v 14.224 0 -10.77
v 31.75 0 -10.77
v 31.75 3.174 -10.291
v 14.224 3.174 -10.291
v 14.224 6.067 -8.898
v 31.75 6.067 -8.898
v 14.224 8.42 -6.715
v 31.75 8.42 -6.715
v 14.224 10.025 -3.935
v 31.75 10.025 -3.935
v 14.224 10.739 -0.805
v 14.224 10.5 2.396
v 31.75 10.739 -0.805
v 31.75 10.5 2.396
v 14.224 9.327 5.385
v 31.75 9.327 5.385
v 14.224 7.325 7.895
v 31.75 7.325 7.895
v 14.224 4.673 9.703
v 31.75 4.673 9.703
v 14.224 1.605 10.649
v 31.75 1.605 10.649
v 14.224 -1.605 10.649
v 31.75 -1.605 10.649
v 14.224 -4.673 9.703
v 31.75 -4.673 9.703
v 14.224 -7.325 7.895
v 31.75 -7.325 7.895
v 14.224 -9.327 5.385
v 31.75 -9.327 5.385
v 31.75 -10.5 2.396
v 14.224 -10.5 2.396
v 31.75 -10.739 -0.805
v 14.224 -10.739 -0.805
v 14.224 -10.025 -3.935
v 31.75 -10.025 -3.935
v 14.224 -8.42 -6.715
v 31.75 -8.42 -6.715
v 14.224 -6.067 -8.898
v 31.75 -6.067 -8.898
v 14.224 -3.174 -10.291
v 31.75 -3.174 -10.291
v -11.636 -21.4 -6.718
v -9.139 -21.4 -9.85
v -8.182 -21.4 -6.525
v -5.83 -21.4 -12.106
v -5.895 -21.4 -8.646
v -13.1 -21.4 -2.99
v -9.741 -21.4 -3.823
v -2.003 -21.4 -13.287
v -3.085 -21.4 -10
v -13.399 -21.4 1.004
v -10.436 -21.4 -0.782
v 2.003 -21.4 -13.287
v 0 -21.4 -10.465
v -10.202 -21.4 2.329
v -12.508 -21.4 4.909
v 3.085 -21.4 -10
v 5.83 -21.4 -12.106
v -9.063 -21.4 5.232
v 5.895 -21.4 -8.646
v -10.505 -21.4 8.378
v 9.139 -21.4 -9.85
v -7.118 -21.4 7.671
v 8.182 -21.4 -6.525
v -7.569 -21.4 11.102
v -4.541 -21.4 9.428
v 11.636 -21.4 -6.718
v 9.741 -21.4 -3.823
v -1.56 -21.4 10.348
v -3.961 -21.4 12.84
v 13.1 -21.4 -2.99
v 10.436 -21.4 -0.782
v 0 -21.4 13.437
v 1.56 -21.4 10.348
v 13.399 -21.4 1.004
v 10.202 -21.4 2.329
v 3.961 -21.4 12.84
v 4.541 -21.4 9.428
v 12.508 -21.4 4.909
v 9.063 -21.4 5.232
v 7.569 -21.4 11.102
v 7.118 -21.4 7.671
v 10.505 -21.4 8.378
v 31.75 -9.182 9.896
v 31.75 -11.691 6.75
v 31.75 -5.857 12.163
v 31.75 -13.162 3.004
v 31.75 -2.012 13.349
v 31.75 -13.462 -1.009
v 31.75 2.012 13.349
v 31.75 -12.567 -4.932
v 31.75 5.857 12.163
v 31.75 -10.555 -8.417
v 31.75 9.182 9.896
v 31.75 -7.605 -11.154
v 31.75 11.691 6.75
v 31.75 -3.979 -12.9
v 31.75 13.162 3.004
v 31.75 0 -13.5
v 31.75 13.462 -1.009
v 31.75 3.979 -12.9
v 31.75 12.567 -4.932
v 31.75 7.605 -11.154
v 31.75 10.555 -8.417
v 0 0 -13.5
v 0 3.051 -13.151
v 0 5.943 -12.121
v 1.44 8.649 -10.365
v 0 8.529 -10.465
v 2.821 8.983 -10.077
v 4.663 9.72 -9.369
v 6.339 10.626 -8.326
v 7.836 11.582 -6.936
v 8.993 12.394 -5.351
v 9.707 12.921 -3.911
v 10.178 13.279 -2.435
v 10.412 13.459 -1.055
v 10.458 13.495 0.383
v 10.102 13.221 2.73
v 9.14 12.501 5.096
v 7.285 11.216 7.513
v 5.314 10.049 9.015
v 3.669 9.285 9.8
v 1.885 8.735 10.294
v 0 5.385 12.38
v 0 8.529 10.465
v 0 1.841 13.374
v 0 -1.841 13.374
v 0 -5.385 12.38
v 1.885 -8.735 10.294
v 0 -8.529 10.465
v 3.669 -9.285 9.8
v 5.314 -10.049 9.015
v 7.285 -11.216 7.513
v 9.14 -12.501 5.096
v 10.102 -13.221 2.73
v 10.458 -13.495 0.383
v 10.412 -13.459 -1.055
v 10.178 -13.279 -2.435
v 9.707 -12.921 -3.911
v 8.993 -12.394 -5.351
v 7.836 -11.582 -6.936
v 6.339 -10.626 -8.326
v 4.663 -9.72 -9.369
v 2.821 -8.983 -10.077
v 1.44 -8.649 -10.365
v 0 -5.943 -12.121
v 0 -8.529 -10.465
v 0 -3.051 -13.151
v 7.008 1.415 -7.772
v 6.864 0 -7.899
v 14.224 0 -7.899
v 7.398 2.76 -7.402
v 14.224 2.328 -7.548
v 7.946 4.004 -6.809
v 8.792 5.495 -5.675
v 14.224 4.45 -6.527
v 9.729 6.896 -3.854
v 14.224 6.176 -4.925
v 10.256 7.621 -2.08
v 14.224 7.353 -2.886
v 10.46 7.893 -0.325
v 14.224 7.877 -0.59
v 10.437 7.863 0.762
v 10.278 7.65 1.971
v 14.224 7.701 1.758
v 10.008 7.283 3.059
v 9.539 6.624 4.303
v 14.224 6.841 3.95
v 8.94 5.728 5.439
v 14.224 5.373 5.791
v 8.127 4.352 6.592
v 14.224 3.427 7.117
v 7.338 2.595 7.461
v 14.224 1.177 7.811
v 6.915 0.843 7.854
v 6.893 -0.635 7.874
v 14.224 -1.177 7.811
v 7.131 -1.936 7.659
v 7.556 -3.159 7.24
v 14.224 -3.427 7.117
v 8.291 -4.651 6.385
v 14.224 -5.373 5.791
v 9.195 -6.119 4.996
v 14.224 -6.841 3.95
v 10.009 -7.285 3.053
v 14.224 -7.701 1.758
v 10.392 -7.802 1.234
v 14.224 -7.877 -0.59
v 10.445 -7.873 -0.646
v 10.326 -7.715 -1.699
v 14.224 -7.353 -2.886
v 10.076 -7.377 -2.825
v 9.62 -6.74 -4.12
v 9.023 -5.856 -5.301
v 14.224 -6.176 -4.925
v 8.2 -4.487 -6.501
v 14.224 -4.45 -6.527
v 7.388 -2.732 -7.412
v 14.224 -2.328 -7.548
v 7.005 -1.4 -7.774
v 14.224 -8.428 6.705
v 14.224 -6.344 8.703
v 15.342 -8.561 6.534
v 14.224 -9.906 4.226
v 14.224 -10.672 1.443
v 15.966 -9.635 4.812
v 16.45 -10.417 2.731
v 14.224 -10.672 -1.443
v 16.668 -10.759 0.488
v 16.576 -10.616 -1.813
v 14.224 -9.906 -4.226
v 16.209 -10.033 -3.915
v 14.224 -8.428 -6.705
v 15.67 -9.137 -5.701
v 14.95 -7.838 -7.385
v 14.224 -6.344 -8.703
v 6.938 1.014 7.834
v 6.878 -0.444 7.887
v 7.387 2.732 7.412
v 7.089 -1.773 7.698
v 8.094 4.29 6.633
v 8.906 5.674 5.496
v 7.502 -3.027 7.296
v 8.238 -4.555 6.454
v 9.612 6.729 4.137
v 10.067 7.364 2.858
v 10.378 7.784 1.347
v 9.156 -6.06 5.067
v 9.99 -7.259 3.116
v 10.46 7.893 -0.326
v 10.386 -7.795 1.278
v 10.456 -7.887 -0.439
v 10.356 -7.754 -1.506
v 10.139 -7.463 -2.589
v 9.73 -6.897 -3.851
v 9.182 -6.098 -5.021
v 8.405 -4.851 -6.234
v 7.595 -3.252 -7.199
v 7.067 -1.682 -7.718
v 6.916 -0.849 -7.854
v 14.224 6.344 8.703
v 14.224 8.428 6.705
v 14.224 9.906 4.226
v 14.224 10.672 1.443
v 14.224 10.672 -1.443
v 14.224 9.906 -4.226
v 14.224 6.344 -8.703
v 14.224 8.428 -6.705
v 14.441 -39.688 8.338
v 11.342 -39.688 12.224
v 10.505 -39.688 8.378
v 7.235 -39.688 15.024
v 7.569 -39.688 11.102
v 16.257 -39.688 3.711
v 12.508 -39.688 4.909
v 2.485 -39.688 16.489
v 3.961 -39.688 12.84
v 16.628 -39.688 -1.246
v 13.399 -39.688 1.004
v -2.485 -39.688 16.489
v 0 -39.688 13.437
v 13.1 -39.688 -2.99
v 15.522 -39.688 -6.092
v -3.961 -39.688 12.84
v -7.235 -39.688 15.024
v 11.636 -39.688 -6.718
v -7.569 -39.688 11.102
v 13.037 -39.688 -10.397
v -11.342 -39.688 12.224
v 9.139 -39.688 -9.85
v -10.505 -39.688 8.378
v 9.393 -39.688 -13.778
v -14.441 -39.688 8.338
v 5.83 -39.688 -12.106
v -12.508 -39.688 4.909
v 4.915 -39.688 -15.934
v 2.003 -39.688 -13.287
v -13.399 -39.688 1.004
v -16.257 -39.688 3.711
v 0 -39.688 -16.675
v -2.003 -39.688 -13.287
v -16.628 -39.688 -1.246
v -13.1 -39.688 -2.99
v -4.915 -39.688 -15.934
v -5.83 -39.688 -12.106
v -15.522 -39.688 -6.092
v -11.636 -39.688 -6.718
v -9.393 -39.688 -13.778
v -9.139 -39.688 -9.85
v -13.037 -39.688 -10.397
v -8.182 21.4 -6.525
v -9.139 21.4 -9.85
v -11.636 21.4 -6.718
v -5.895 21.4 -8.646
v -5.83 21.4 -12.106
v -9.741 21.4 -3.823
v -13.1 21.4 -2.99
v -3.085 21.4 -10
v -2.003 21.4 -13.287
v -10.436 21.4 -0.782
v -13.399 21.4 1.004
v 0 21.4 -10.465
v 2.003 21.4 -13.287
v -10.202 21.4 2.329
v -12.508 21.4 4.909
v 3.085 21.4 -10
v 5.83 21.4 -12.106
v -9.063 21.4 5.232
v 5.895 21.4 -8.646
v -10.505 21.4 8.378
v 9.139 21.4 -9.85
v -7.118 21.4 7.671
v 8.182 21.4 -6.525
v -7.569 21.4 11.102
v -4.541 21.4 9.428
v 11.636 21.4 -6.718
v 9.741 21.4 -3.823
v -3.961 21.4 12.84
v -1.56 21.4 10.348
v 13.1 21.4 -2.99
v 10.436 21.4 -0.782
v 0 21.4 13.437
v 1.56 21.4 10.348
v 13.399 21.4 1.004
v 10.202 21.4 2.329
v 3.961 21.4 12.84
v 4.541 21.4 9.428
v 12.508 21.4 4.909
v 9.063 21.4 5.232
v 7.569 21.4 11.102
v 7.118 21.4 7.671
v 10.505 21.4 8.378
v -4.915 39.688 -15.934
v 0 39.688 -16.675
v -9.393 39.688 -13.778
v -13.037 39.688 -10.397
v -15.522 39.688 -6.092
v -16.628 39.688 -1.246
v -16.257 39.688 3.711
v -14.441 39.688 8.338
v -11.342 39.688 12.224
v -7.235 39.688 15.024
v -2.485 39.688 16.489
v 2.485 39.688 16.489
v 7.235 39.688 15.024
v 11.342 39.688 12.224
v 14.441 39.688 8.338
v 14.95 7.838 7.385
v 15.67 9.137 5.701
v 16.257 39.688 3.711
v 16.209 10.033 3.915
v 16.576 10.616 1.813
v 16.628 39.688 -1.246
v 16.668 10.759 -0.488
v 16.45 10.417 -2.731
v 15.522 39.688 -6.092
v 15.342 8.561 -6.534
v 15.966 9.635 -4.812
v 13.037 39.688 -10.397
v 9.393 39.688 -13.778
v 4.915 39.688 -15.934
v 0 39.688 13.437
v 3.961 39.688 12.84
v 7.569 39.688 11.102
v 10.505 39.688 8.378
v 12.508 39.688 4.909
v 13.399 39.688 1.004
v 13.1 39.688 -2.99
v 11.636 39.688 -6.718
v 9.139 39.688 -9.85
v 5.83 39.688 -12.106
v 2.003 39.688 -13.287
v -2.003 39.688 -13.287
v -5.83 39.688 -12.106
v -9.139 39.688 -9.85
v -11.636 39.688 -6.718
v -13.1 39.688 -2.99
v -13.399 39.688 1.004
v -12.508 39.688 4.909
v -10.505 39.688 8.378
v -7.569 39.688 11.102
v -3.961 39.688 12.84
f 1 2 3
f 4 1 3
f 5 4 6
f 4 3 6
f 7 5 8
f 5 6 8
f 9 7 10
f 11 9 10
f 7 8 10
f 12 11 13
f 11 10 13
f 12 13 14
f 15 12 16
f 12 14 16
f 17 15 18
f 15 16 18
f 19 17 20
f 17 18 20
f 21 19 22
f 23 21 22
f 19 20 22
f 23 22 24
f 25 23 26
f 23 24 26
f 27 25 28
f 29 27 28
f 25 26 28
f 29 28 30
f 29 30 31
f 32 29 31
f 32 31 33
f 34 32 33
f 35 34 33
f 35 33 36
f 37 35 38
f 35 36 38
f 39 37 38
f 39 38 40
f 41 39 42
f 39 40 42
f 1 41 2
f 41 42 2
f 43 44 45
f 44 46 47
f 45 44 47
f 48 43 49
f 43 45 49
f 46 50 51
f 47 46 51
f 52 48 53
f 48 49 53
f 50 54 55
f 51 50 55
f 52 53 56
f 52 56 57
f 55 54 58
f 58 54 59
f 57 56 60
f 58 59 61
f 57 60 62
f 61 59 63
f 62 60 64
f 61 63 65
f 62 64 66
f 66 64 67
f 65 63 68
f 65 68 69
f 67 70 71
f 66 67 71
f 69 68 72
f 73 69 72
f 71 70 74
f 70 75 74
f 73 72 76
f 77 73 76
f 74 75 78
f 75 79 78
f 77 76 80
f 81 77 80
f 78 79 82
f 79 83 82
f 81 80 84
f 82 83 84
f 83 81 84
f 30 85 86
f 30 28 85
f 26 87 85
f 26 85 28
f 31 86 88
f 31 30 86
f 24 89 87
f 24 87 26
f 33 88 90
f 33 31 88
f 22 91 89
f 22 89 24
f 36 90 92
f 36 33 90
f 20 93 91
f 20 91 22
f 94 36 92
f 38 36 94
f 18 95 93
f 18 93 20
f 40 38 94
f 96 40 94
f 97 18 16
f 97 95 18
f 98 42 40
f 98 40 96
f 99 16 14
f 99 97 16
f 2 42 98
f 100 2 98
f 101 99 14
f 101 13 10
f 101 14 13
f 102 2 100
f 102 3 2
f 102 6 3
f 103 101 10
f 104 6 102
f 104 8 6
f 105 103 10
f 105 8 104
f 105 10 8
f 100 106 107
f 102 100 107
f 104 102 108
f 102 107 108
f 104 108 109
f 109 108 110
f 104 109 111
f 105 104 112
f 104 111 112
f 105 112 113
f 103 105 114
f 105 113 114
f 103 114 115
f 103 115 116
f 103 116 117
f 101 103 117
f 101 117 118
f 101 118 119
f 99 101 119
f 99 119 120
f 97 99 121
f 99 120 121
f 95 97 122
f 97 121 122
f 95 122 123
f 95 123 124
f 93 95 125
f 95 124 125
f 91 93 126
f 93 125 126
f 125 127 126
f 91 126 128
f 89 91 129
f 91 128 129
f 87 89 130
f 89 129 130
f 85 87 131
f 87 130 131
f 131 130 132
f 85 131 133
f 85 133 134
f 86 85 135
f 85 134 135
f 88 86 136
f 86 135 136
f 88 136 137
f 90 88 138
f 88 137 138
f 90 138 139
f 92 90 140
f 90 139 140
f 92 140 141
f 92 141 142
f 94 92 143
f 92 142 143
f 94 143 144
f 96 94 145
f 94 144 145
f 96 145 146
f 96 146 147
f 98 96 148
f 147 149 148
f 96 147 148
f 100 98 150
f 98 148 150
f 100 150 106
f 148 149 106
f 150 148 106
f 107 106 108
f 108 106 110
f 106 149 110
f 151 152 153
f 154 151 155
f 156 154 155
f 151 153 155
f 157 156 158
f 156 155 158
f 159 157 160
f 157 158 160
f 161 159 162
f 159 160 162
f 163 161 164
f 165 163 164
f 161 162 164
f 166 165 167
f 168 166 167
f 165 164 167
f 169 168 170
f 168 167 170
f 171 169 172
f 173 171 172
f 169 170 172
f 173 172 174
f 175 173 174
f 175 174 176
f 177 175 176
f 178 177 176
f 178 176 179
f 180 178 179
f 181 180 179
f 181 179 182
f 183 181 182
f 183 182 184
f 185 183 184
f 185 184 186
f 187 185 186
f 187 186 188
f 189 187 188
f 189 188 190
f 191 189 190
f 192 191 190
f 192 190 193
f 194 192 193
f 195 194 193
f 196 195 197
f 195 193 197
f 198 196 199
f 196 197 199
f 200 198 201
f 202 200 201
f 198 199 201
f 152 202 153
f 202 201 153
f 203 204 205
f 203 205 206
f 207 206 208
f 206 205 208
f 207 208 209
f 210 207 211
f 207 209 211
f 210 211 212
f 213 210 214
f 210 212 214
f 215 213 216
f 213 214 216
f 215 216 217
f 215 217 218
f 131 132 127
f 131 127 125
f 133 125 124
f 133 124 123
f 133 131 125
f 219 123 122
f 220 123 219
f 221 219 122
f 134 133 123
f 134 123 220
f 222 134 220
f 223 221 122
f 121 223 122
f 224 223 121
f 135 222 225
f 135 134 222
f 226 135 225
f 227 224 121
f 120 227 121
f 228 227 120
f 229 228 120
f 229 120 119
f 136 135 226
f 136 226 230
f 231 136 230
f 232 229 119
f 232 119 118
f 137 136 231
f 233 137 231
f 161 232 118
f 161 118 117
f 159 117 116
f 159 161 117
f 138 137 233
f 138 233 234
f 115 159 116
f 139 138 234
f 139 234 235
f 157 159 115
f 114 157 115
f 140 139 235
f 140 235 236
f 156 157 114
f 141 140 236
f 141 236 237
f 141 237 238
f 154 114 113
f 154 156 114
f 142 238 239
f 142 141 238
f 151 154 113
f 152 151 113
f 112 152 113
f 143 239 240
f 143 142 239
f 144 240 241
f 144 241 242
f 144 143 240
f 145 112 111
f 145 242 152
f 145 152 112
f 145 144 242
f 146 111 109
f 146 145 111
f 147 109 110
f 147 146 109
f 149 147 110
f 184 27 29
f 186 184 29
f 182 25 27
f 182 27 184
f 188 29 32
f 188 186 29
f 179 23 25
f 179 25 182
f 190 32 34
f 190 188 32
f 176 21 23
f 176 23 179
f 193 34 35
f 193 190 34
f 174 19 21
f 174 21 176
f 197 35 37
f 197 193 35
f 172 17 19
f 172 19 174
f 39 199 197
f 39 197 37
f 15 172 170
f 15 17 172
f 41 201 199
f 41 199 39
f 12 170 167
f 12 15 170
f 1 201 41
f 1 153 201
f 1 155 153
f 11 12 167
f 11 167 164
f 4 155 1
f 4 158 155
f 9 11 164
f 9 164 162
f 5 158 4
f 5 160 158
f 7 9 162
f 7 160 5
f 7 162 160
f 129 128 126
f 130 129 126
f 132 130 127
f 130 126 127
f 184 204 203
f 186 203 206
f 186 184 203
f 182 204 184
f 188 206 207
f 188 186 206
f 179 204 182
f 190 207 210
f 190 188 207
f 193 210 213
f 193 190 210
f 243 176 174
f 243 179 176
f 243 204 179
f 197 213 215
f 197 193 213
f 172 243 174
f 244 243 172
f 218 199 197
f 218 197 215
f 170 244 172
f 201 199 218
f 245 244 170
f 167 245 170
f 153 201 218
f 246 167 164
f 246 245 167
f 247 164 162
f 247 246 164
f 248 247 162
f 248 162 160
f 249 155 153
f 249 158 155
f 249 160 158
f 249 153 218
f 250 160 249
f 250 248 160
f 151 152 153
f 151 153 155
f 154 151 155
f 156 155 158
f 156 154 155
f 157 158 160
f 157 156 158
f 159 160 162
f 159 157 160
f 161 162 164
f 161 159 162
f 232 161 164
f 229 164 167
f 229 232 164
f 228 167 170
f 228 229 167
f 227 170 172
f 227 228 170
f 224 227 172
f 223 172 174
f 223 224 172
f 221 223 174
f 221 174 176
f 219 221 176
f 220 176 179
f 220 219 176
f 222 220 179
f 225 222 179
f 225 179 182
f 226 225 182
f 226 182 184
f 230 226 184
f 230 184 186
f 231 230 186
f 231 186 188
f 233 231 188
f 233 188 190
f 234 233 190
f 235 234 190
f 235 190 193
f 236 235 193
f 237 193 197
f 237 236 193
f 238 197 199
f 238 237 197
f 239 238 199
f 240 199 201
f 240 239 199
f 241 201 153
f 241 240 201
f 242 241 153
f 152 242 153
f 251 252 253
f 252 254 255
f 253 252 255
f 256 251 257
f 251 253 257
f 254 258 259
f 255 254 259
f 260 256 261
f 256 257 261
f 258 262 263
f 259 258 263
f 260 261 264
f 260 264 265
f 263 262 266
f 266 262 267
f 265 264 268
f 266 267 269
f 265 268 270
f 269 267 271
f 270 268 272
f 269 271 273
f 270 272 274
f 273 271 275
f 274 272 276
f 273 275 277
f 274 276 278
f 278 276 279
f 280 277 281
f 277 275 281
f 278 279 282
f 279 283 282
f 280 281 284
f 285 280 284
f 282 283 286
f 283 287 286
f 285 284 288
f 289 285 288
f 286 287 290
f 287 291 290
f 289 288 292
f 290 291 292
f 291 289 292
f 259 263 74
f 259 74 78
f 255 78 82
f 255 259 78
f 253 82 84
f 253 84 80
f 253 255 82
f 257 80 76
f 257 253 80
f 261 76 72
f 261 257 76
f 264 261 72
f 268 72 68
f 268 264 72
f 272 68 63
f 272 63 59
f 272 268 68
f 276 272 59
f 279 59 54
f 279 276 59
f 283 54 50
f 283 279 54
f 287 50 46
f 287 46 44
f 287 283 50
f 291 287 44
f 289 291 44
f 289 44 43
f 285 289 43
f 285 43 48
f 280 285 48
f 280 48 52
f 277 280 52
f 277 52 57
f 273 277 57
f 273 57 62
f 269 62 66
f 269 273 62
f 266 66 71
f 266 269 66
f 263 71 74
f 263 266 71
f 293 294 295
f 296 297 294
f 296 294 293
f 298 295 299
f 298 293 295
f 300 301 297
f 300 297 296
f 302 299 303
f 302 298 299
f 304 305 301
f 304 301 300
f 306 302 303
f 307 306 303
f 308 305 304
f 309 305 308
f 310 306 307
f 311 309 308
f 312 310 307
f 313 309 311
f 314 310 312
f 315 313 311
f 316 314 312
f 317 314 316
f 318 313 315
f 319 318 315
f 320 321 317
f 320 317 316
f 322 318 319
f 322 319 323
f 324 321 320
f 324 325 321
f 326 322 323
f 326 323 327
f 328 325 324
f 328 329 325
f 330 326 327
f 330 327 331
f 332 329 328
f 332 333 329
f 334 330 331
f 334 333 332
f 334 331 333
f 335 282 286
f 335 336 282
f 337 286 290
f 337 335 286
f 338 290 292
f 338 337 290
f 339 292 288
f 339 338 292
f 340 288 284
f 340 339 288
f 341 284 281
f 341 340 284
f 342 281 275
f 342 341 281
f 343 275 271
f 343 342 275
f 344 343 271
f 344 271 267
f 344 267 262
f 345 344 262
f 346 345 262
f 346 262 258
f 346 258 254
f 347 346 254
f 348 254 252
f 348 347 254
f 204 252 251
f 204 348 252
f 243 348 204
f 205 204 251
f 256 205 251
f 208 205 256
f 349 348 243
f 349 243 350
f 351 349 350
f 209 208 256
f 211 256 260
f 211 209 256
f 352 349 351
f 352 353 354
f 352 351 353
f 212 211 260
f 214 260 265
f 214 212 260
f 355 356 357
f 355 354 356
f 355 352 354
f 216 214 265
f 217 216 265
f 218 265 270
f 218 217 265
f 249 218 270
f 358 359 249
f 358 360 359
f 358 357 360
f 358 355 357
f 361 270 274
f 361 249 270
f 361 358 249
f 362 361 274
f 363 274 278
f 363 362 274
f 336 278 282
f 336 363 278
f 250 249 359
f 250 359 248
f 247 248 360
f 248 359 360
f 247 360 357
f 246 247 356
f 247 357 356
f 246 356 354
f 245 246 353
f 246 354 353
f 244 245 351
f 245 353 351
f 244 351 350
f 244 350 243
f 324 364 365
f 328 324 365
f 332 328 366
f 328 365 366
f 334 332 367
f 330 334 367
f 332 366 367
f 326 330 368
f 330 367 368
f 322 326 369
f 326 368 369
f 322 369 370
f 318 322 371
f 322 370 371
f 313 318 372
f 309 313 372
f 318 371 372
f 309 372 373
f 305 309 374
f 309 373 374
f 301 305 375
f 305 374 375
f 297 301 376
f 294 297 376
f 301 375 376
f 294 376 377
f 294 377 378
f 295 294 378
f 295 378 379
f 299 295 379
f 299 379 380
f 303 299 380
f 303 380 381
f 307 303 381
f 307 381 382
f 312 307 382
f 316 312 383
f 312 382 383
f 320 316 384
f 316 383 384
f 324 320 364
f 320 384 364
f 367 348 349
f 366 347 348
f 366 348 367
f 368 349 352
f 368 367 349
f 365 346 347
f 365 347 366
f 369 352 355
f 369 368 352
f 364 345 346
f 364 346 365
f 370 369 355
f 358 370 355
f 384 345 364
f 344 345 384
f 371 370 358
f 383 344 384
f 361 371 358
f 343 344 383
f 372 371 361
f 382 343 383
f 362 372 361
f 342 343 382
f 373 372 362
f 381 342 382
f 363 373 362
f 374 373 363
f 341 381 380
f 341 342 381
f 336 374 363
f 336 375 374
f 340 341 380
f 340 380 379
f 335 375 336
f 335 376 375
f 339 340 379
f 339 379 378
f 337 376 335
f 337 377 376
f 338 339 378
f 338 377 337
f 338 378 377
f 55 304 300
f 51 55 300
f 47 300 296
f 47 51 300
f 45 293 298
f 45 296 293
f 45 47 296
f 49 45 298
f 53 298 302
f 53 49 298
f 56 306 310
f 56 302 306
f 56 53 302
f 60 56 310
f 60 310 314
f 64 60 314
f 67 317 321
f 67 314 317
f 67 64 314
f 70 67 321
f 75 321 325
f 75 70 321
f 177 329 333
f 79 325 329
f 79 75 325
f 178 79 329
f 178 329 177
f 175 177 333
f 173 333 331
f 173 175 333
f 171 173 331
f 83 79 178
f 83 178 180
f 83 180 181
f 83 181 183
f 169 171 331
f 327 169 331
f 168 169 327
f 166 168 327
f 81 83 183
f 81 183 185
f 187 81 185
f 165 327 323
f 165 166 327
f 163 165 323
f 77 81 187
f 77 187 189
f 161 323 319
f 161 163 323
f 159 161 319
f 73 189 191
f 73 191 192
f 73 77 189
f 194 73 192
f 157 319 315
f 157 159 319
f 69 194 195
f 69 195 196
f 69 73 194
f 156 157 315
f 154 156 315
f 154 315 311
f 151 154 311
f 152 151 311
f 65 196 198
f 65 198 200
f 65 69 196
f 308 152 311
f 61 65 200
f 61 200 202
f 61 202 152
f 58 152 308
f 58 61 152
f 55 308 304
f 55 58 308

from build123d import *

# Parameters (mm, degrees)
SKETCH1_R               = 16.6751
SKETCH1_R_2             = 10.4648
BOSS_EXTRUDE1_DEPTH     = 39.6875
SKETCH2_R               = 13.5001
SKETCH2_R_2             = 7.8994
BOSS_EXTRUDE2_DEPTH     = 31.75
CUT_EXTRUDE3_REACH      = 66.793
CUT_EXTRUDE3_END_RADIUS = 10.4648
SKETCH4_R               = 7.8994
CUT_EXTRUDE4_START      = -79.375
SKETCH5_R               = 10.4648
CUT_EXTRUDE4_DEPTH      = 79.375
SKETCH6_R               = 10.7696
CUT_EXTRUDE5_DEPTH      = 17.526
SKETCH8_R               = 13.4366
CUT_EXTRUDE6_DEPTH      = 18.288


with BuildPart() as part:
    # Sketch1 → Boss-Extrude1 (new, symmetric)
    with BuildSketch(Plane(origin=(0, 0, 0), x_dir=(1, 0, 0), z_dir=(0, 1, 0))):
        with Locations(Location((0, 0, 0), (0, 0, 90))):
            Circle(SKETCH1_R)
        with Locations(Location((0, 0, 0), (0, 0, 90))):
            Circle(SKETCH1_R_2, mode=Mode.SUBTRACT)
    extrude(amount=BOSS_EXTRUDE1_DEPTH, both=True)

    # Cut-Extrude3: up to this cylinder (the profile starts outside it)
    cut_extrude3_end = Plane(origin=(0, 0, 0), z_dir=(0, -1, 0)) * Cylinder(CUT_EXTRUDE3_END_RADIUS, 155.5156, mode=Mode.PRIVATE)
    # Sketch4 → Cut-Extrude3 (cut, up to the surface)
    with BuildSketch(Plane(origin=(31.75, 0, 0), x_dir=(0, 0, -1), z_dir=(1, 0, 0)), mode=Mode.PRIVATE) as cut_extrude3_sk1:
        Circle(SKETCH4_R)
    cut_extrude3_tool1 = extrude(cut_extrude3_sk1.sketch, amount=-CUT_EXTRUDE3_REACH, mode=Mode.PRIVATE) - cut_extrude3_end
    add(cut_extrude3_tool1.solids().sort_by_distance((31.75, 0, 0))[0], mode=Mode.SUBTRACT)


with BuildPart() as body_2:
    # Sketch2 → Boss-Extrude2 (new body)
    with BuildSketch(Plane(origin=(0, 0, 0), x_dir=(0, 0, -1), z_dir=(1, 0, 0))):
        Circle(SKETCH2_R)
        Circle(SKETCH2_R_2, mode=Mode.SUBTRACT)
    extrude(amount=BOSS_EXTRUDE2_DEPTH)

    # Sketch5 → Cut-Extrude4 (cut)
    with BuildSketch(Plane(origin=(0, 39.6875, 0), x_dir=(1, 0, 0), z_dir=(0, 1, 0)).offset(CUT_EXTRUDE4_START)):
        with Locations(Location((0, 0, 0), (0, 0, 270))):
            Circle(SKETCH5_R)
    extrude(amount=CUT_EXTRUDE4_DEPTH, mode=Mode.SUBTRACT)


with BuildPart() as cut_extrude5_tool:
    # Sketch6 → Cut-Extrude5 (new body)
    with BuildSketch(Plane(origin=(31.75, 0, 0), x_dir=(0, 0, -1), z_dir=(1, 0, 0))):
        Circle(SKETCH6_R)
    extrude(amount=-CUT_EXTRUDE5_DEPTH)


with BuildPart() as part_1:
    add(part.part)

    # Cut-Extrude5: cut by cut_extrude5_tool
    add(cut_extrude5_tool.part, mode=Mode.SUBTRACT)

    # Sketch8 → Cut-Extrude6 (cut)
    with BuildSketch(Plane(origin=(0, 39.6875, 0), x_dir=(1, 0, 0), z_dir=(0, 1, 0))):
        with Locations(Location((0, 0, 0), (0, 0, 270))):
            Circle(SKETCH8_R)
    cut_extrude6 = extrude(amount=-CUT_EXTRUDE6_DEPTH, mode=Mode.SUBTRACT)

    # Mirror1: Cut-Extrude6 across plane
    add(cut_extrude6.mirror(Plane.ZX), mode=Mode.SUBTRACT)


with BuildPart() as body_2_1:
    add(body_2.part)

    # Cut-Extrude5: cut by cut_extrude5_tool
    add(cut_extrude5_tool.part, mode=Mode.SUBTRACT)


solid = Compound([part_1.part, body_2_1.part])
